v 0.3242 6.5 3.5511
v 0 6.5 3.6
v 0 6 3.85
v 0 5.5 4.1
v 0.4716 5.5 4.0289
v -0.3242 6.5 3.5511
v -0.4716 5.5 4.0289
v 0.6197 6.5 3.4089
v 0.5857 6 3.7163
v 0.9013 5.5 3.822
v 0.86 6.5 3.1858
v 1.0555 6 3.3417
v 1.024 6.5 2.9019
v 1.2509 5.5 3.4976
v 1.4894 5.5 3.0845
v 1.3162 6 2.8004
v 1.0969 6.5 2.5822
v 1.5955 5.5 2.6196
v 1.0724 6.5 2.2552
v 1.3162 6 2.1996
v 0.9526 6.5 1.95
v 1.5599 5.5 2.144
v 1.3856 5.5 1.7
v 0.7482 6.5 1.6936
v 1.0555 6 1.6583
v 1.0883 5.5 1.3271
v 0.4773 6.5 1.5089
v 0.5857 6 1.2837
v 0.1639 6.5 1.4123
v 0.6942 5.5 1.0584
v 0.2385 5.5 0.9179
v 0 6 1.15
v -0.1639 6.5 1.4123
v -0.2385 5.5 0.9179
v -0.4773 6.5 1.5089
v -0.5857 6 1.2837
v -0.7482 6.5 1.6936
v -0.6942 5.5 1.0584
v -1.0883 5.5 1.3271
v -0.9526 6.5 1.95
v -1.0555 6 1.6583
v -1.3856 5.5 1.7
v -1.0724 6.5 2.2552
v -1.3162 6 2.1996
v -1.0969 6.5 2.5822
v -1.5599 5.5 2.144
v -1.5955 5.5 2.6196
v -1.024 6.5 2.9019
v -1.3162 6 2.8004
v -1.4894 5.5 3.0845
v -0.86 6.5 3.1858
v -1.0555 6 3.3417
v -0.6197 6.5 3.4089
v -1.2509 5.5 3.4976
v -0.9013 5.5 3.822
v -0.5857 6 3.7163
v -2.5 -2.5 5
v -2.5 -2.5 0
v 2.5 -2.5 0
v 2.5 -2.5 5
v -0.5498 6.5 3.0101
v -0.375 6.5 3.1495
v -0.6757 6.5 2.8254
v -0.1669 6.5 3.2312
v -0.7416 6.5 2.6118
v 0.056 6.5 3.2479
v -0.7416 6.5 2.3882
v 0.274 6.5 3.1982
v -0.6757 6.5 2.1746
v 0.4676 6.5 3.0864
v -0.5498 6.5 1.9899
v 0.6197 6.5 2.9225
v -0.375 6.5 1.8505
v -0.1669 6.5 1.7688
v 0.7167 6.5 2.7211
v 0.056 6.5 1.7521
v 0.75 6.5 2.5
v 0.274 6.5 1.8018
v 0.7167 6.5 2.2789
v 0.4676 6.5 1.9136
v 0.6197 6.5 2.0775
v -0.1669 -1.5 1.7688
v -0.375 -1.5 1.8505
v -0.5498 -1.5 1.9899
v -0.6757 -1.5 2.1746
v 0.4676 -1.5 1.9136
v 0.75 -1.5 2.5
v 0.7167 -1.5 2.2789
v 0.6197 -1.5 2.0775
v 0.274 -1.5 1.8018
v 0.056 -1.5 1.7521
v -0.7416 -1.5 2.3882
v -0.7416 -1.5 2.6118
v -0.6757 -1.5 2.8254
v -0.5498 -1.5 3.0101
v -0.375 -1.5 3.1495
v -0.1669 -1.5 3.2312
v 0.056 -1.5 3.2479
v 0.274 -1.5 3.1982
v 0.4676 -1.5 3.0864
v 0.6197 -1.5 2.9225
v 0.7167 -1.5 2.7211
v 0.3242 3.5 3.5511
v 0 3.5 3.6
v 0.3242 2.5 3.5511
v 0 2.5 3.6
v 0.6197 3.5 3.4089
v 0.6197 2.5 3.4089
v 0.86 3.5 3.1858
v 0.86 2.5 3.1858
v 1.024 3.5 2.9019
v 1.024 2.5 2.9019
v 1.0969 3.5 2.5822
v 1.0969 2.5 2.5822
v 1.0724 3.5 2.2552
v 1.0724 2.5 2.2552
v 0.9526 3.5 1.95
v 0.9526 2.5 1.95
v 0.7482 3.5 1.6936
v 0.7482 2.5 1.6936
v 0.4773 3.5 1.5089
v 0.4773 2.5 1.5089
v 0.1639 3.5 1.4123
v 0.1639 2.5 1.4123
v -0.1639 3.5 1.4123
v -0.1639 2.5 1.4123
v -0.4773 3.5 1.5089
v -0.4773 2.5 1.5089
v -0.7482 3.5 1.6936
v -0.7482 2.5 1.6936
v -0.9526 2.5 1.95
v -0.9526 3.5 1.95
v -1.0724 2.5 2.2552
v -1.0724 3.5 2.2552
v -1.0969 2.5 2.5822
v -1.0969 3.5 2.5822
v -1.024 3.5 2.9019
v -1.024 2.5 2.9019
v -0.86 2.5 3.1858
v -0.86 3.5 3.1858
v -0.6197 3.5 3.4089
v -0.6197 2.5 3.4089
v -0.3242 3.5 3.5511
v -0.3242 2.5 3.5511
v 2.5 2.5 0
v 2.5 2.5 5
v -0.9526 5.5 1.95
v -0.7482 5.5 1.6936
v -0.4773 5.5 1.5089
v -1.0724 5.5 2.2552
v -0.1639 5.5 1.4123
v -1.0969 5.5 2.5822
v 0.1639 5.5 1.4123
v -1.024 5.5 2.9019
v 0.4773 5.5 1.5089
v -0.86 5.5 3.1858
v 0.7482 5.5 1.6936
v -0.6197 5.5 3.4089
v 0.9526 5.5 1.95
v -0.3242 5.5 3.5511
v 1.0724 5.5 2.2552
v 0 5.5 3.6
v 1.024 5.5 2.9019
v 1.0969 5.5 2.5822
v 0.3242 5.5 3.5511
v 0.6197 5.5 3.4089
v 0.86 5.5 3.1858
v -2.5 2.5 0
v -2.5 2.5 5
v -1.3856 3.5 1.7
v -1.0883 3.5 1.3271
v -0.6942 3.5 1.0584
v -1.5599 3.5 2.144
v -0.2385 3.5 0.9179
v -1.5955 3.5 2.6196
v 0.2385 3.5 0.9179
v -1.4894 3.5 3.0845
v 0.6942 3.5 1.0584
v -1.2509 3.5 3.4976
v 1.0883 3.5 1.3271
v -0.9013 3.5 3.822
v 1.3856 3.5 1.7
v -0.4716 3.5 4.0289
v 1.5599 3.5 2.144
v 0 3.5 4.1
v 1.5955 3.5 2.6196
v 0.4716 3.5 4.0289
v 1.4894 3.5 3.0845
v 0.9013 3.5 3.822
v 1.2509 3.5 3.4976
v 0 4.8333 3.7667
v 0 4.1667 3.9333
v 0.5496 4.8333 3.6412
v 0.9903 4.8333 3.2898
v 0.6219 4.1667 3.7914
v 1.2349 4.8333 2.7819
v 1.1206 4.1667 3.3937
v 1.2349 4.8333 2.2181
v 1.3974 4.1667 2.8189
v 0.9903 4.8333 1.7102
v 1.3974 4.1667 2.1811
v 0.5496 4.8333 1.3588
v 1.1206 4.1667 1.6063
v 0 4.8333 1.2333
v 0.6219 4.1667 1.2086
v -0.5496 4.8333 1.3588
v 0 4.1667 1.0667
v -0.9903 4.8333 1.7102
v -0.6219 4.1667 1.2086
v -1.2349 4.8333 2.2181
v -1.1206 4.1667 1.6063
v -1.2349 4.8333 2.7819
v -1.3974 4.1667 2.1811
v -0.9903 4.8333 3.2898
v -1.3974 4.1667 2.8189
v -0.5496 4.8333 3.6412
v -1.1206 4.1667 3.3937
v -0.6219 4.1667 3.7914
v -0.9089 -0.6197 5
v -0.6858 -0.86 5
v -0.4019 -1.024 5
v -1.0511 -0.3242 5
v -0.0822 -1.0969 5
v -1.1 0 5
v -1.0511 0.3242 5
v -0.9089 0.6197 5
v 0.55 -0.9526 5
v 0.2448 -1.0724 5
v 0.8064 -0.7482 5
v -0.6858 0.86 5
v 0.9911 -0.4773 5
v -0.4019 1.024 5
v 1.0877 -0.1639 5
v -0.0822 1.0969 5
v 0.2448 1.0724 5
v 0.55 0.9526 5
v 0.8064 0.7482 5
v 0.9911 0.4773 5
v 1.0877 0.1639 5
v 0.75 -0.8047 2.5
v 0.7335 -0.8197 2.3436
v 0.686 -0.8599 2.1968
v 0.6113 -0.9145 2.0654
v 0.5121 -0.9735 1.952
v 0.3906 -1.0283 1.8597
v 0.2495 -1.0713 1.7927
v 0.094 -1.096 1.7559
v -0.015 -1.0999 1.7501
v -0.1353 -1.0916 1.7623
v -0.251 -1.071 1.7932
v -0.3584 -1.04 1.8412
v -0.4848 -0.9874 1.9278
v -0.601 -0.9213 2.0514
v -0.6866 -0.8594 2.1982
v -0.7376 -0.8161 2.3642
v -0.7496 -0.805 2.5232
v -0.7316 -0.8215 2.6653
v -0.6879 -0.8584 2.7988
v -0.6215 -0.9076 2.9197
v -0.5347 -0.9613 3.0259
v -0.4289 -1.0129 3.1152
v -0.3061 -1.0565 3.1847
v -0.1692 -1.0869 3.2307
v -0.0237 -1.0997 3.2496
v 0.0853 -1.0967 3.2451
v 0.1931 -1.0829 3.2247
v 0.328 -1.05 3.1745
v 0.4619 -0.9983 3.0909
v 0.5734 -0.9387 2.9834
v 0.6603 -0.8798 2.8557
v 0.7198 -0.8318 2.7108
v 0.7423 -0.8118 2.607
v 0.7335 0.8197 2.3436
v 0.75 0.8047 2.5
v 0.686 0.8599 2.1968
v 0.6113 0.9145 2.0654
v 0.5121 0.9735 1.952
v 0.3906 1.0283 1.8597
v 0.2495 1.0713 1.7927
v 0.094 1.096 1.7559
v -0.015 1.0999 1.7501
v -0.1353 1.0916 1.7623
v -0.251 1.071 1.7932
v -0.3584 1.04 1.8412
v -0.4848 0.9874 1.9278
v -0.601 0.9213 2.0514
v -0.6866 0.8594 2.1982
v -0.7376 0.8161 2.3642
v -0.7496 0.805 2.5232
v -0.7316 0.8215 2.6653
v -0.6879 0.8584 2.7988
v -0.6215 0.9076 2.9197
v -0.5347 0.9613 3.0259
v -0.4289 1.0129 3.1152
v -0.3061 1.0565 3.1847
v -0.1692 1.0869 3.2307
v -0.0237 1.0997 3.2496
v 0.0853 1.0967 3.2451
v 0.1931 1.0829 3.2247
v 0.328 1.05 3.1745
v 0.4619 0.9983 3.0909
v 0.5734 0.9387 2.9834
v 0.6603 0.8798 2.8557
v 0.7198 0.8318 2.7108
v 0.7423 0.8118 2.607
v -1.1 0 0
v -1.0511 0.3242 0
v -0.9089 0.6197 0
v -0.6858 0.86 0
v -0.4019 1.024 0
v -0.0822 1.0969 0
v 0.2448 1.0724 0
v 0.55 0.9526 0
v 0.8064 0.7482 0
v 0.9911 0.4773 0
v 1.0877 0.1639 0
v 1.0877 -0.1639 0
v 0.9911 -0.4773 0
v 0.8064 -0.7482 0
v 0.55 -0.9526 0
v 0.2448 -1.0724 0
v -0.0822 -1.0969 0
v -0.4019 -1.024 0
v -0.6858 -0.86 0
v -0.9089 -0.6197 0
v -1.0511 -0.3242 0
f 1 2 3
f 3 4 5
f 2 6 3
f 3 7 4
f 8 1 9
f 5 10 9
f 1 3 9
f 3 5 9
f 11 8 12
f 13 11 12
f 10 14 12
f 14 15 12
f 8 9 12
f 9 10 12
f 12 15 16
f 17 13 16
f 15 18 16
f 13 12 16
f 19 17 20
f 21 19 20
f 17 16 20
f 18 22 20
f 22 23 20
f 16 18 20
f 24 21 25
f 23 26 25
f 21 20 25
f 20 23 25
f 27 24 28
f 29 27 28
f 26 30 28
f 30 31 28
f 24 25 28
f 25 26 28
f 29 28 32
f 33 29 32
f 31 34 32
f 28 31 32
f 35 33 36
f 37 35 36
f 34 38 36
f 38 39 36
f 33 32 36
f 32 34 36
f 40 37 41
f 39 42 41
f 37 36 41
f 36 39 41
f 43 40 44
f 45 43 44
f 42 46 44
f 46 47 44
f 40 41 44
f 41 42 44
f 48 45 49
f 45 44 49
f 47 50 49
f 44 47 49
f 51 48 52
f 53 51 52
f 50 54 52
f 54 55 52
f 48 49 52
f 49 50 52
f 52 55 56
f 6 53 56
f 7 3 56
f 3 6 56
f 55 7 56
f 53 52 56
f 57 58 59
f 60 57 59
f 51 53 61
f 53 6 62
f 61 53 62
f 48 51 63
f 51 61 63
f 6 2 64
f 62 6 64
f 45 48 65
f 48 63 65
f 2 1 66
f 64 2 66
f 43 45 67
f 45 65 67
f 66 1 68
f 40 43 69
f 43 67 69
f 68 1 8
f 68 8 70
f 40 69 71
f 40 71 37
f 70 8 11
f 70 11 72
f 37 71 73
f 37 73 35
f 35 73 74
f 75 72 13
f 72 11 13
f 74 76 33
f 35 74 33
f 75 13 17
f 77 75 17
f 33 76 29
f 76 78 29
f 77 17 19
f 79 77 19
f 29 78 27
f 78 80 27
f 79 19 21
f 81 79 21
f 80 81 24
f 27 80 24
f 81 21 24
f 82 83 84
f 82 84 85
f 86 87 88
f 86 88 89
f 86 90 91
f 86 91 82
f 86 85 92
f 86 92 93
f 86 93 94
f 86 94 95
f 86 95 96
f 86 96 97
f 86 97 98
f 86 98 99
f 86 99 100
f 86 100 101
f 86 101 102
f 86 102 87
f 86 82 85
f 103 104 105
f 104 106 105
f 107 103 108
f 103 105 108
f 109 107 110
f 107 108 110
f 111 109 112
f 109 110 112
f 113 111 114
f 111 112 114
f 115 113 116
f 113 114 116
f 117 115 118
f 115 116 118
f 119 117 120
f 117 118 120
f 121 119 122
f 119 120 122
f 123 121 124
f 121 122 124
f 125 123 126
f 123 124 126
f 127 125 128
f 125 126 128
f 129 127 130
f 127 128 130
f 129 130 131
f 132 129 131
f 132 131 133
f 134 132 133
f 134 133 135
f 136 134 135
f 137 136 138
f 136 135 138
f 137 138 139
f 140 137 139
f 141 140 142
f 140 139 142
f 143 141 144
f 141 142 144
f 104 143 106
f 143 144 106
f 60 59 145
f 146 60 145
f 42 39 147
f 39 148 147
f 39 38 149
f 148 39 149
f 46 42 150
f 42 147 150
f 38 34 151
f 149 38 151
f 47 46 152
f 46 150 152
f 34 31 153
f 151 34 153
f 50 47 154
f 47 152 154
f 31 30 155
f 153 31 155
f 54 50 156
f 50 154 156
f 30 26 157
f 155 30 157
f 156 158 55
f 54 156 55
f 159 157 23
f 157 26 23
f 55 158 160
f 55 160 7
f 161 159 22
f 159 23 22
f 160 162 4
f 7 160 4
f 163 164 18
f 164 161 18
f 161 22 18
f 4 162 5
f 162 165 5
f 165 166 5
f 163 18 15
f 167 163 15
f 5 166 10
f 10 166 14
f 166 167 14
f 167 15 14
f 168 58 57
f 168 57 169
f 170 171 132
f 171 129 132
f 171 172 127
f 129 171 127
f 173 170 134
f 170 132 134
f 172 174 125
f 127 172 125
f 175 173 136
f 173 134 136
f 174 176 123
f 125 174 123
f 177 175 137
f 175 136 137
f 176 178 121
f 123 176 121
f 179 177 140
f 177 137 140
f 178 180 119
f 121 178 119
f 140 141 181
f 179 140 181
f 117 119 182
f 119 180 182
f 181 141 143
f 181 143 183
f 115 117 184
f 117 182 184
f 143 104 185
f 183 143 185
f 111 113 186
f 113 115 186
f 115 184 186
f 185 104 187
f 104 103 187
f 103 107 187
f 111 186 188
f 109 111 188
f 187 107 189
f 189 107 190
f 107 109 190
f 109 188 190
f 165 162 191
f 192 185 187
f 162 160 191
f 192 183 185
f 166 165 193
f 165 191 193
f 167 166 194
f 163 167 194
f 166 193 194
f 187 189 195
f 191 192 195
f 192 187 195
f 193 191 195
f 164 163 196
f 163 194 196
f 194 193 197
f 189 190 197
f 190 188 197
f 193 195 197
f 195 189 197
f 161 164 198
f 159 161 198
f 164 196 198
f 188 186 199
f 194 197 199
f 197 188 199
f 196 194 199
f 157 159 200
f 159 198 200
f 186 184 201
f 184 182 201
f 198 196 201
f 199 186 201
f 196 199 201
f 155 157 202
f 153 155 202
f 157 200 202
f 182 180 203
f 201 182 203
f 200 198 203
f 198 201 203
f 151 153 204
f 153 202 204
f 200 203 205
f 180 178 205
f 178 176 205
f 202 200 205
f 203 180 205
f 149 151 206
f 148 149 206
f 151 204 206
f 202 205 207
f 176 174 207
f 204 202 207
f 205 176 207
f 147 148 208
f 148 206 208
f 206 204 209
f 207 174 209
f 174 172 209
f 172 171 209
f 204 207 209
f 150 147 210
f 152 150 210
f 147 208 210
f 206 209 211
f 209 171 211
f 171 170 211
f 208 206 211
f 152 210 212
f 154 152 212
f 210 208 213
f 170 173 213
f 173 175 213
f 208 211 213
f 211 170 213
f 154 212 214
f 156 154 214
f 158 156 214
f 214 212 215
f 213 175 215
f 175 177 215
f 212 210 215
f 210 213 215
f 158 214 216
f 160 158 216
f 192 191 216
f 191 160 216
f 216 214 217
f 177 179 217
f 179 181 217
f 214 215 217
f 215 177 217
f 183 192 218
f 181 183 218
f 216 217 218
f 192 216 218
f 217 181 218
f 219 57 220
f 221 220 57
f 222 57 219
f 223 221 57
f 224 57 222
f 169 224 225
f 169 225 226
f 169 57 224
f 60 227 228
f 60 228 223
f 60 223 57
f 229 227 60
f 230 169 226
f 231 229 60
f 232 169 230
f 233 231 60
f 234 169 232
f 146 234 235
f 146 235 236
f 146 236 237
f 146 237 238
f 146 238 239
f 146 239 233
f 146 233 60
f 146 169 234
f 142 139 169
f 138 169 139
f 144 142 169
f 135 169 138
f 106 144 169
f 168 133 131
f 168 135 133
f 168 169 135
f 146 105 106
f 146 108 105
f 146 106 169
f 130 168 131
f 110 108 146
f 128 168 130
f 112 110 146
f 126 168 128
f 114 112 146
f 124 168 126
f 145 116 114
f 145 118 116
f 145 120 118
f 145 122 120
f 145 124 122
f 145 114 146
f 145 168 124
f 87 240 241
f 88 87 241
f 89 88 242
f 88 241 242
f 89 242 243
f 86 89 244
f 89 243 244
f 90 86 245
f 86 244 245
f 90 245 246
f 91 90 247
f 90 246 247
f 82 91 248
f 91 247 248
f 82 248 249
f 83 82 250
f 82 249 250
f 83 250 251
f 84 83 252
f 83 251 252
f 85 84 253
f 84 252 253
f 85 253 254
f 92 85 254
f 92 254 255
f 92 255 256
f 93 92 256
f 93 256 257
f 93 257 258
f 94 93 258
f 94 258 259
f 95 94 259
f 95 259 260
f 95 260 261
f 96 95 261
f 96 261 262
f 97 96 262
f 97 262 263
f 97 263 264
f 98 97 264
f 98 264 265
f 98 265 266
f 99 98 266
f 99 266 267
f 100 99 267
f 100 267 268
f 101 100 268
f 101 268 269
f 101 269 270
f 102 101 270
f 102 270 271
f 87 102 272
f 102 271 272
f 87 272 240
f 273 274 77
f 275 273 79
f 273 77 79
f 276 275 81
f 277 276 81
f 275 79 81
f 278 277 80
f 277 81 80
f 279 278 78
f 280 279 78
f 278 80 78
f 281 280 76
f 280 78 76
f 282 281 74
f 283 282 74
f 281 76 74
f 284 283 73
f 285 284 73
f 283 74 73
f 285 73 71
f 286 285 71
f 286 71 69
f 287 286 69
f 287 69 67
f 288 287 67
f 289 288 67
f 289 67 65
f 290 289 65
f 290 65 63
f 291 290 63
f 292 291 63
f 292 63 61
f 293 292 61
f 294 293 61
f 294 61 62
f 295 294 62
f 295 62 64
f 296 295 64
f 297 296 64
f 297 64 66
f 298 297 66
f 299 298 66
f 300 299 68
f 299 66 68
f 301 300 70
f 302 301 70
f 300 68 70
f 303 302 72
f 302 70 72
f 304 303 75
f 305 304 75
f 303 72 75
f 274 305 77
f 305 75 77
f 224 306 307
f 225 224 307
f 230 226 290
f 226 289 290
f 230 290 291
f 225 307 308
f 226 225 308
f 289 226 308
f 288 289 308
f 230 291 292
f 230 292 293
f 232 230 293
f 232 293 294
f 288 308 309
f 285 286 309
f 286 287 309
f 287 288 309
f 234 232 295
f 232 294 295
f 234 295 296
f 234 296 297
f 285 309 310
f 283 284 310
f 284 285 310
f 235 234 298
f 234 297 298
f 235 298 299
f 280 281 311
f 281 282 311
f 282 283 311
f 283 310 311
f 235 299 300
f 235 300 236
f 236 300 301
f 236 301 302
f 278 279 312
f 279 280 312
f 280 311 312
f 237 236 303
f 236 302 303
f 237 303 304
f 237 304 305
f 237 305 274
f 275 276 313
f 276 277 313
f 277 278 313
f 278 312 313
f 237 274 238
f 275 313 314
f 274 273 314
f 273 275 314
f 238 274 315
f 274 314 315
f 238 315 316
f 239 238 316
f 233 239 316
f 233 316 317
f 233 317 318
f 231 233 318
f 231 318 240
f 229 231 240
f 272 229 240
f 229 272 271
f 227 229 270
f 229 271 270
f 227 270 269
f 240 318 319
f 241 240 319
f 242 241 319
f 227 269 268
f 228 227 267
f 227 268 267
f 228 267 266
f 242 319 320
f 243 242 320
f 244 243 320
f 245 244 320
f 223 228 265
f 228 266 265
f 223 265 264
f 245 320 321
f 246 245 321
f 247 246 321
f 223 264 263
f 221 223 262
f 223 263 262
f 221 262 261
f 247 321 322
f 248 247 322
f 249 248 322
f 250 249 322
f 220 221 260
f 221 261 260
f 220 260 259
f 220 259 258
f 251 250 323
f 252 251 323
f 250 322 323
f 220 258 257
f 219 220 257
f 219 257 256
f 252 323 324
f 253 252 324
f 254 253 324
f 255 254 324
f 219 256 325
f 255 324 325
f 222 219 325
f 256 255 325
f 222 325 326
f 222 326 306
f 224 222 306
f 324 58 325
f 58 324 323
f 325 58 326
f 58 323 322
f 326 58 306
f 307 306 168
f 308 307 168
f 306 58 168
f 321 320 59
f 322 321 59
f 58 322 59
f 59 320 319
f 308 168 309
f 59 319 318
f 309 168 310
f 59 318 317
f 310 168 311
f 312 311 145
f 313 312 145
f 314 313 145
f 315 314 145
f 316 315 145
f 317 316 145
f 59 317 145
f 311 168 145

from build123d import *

# Parameters (mm, degrees)
SKETCH1_W           = 5
SKETCH1_H           = 5
BOSS_EXTRUDE1_DEPTH = 5
SKETCH5_R           = 0.75
CUT_EXTRUDE1_DEPTH  = 8
SKETCH6_R           = 1.1
CUT_EXTRUDE2_DEPTH  = 8


with BuildPart() as part:
    # Sketch1 → Boss-Extrude1 (new body)
    with BuildSketch(Plane.XY):
        Rectangle(SKETCH1_W, SKETCH1_H)
    extrude(amount=BOSS_EXTRUDE1_DEPTH)

    # Sketch2 → Revolve1 (revolve)
    with BuildSketch(Plane(origin=(0, 0, 0), x_dir=(0, 0, -1), z_dir=(1, 0, 0))):
        Polygon((-2.5, 2.5), (-2.5, 6.5), (-3.6, 6.5), (-4.1, 5.5), (-3.6, 5.5), (-4.1, 3.5), (-3.6, 3.5), (-3.6, 2.5), align=None)
    revolve(axis=Axis((0, 2.5, 2.5), (0, 1, 0)))

    # Sketch5 → Cut-Extrude1 (cut)
    with BuildSketch(Plane(origin=(0, 6.5, 0), x_dir=(1, 0, 0), z_dir=(0, 1, 0))):
        with Locations((0, -2.5)):
            Circle(SKETCH5_R)
    extrude(amount=-CUT_EXTRUDE1_DEPTH, mode=Mode.SUBTRACT)

    # Sketch6 → Cut-Extrude2 (cut)
    with BuildSketch(Plane(origin=(0, 0, 0), x_dir=(-1, 0, 0), z_dir=(0, 0, -1))):
        Circle(SKETCH6_R)
    extrude(amount=-CUT_EXTRUDE2_DEPTH, mode=Mode.SUBTRACT)


solid = part.part
